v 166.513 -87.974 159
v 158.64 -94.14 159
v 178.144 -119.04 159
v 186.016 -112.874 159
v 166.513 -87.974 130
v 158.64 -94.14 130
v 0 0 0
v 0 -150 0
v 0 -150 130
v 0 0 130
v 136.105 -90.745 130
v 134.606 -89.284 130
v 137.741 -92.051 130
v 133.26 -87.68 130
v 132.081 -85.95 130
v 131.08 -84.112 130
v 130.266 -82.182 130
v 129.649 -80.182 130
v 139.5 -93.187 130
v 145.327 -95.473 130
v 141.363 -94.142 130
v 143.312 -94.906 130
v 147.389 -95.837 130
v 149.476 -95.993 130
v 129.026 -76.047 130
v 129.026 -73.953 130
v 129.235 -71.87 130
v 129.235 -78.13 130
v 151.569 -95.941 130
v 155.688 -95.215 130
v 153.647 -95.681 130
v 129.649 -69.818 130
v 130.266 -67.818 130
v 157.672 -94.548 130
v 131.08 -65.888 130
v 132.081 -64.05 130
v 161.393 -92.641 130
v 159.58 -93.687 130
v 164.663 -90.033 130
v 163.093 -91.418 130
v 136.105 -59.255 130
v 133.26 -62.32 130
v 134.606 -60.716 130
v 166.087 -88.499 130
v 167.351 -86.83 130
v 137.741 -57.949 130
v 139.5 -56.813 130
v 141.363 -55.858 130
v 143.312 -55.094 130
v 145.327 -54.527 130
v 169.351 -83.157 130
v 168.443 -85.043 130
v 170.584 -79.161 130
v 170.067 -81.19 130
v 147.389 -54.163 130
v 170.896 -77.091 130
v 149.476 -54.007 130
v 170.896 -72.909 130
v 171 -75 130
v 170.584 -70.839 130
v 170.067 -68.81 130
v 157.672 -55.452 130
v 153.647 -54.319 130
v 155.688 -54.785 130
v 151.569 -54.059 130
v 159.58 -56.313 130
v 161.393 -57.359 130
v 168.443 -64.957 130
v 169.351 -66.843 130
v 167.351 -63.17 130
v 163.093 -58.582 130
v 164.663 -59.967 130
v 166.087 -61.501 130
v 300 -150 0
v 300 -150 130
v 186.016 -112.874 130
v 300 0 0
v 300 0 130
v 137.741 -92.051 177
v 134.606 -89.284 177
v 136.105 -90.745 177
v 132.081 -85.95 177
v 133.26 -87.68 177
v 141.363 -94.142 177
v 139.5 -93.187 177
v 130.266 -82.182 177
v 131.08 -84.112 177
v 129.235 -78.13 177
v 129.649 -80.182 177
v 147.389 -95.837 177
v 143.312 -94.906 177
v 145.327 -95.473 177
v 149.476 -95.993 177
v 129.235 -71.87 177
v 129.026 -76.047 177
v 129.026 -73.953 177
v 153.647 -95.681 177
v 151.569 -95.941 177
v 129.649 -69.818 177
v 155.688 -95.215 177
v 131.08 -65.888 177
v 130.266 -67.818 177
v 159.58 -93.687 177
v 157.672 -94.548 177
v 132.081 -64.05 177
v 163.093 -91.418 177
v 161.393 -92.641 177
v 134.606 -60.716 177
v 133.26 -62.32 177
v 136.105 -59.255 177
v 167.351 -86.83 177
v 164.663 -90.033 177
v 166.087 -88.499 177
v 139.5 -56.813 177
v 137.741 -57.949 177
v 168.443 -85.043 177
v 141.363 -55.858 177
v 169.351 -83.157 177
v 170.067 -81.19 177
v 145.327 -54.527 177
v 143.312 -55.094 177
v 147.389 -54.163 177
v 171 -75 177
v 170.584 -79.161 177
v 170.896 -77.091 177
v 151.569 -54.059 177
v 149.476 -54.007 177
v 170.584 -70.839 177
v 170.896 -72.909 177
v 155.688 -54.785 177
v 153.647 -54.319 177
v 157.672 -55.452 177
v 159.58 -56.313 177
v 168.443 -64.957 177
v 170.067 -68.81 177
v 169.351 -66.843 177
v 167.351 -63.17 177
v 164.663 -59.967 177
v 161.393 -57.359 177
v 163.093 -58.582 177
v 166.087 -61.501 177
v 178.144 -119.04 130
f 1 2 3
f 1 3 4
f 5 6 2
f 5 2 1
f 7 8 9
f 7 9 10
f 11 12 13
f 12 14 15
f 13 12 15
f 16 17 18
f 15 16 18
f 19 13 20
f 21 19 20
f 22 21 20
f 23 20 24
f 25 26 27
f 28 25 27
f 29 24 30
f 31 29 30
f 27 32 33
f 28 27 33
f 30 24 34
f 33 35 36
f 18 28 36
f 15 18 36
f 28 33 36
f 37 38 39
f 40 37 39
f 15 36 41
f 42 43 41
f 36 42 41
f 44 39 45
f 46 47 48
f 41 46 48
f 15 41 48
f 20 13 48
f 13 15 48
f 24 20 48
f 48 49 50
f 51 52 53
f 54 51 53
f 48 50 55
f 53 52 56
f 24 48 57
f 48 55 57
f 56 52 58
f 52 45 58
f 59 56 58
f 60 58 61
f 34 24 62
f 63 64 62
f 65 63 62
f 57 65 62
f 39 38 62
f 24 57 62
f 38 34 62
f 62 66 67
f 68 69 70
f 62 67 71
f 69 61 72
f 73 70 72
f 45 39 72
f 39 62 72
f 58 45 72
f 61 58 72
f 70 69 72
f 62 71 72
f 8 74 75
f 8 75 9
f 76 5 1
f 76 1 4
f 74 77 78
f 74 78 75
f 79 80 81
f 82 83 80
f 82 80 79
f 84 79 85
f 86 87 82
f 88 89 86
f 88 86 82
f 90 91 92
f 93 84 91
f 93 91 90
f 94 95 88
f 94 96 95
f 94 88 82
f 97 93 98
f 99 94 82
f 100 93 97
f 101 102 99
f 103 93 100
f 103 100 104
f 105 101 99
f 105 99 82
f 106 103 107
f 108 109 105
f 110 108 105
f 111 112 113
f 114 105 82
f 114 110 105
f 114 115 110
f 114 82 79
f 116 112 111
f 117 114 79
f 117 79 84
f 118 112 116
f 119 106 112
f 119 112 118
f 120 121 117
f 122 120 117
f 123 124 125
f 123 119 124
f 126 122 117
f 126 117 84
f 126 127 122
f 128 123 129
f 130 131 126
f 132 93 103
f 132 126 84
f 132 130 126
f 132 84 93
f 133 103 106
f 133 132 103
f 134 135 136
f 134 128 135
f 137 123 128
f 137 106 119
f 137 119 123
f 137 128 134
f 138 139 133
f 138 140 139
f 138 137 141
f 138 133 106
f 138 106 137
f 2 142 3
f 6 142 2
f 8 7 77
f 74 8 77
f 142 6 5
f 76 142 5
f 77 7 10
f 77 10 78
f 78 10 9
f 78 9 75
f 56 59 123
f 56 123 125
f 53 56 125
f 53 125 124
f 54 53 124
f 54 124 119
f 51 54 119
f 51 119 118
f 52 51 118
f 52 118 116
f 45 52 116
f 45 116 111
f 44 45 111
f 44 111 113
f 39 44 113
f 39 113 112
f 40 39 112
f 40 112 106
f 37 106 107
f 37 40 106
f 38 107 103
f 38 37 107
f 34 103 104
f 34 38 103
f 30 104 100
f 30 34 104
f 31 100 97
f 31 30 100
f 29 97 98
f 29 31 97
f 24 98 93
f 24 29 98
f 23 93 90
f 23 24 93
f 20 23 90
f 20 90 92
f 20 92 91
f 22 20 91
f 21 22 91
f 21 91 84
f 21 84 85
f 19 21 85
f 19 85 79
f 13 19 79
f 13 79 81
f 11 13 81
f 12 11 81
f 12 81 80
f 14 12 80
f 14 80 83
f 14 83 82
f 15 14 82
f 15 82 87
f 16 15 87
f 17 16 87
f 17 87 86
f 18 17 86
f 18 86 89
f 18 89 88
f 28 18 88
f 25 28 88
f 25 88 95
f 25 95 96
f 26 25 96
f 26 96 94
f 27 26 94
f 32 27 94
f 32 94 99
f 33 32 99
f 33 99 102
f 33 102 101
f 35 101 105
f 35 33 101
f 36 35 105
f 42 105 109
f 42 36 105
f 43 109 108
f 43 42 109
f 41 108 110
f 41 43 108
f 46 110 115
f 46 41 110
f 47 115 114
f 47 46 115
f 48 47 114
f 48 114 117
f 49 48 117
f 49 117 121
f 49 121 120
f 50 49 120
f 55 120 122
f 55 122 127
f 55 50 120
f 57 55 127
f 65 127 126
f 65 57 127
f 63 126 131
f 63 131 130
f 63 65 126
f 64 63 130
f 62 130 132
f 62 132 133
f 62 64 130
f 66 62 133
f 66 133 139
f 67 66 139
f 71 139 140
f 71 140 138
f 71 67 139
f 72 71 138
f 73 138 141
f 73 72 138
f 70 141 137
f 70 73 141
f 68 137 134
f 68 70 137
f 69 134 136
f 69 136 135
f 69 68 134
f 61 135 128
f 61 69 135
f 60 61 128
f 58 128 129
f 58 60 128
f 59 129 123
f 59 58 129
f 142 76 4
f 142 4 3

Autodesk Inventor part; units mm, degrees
ref_plane "YZ Plane" through (0, 0, 0) normal (1, 0, 0) x (0, 1, 0)
ref_plane "XZ Plane" through (0, 0, 0) normal (0, 1, 0) x (-1, 0, 0)
ref_plane "XY Plane" through (0, 0, 0) normal (0, 0, 1) x (1, 0, 0)
sketch "Sketch1" plane through (0, 0, 0) normal (0, 0, 1) x (1, 0, 0)
  line L0 (0, 0) -> (300, 0)
  line L1 (300, 0) -> (300, -150)
  line L2 (300, -150) -> (0, -150)
  line L3 (0, -150) -> (0, 0)
  dimension "d0" = 300
  dimension "d1" = 150
extrude "Extrusion1" add sketch "Sketch1" along normal blind 130
sketch "Sketch2" plane through (0, 0, 130) normal (0, 0, 1) x (1, 0, 0)
  line L0 (0, -150) -> (300, -150) projected
  line L1 (0, 0) -> (300, -150) construction
  line L2 (0, -150) -> (300, 0) construction
  circle A0 centre (150, -75) radius 21
  line L3 (166.513, -87.9739) -> (186.0161, -112.874)
  line L4 (186.0161, -112.874) -> (178.1436, -119.0402)
  line L5 (178.1436, -119.0402) -> (158.6404, -94.1401)
  line L6 (158.6404, -94.1401) -> (166.513, -87.9739)
  line L7 (162.5767, -91.057) -> (182.0799, -115.9571) construction
  line L8 (150, -75) -> (205.4242, -145.7614) construction
  dimension "d4" = 42
  dimension "d5" = 52.025
  dimension "d6" = 51.93
  dimension "d7" = 10
extrude "Extrusion2" add sketch "Sketch2" along normal blind 47 separate body contours A0 L6 | L6 A0
extrude "Extrusion3" add sketch "Sketch2" along normal blind 29 separate body contours L6 A0 | A0 L3 L4 L5 picked at (163.1281, -90.8523)
ref_plane "Work Plane1" through (150, -75, 88.5) normal (0, 0, 1) x (1, 0, 0)
ref_plane "Work Plane2" through (0, -75, 0) normal (0, 1, 0) x (1, 0, 0)
ref_plane "Work Plane3" through (150, -150, 0) normal (-1, 0, 0) x (0, 0, 1)
properties part number "Assembly Mount Base"
